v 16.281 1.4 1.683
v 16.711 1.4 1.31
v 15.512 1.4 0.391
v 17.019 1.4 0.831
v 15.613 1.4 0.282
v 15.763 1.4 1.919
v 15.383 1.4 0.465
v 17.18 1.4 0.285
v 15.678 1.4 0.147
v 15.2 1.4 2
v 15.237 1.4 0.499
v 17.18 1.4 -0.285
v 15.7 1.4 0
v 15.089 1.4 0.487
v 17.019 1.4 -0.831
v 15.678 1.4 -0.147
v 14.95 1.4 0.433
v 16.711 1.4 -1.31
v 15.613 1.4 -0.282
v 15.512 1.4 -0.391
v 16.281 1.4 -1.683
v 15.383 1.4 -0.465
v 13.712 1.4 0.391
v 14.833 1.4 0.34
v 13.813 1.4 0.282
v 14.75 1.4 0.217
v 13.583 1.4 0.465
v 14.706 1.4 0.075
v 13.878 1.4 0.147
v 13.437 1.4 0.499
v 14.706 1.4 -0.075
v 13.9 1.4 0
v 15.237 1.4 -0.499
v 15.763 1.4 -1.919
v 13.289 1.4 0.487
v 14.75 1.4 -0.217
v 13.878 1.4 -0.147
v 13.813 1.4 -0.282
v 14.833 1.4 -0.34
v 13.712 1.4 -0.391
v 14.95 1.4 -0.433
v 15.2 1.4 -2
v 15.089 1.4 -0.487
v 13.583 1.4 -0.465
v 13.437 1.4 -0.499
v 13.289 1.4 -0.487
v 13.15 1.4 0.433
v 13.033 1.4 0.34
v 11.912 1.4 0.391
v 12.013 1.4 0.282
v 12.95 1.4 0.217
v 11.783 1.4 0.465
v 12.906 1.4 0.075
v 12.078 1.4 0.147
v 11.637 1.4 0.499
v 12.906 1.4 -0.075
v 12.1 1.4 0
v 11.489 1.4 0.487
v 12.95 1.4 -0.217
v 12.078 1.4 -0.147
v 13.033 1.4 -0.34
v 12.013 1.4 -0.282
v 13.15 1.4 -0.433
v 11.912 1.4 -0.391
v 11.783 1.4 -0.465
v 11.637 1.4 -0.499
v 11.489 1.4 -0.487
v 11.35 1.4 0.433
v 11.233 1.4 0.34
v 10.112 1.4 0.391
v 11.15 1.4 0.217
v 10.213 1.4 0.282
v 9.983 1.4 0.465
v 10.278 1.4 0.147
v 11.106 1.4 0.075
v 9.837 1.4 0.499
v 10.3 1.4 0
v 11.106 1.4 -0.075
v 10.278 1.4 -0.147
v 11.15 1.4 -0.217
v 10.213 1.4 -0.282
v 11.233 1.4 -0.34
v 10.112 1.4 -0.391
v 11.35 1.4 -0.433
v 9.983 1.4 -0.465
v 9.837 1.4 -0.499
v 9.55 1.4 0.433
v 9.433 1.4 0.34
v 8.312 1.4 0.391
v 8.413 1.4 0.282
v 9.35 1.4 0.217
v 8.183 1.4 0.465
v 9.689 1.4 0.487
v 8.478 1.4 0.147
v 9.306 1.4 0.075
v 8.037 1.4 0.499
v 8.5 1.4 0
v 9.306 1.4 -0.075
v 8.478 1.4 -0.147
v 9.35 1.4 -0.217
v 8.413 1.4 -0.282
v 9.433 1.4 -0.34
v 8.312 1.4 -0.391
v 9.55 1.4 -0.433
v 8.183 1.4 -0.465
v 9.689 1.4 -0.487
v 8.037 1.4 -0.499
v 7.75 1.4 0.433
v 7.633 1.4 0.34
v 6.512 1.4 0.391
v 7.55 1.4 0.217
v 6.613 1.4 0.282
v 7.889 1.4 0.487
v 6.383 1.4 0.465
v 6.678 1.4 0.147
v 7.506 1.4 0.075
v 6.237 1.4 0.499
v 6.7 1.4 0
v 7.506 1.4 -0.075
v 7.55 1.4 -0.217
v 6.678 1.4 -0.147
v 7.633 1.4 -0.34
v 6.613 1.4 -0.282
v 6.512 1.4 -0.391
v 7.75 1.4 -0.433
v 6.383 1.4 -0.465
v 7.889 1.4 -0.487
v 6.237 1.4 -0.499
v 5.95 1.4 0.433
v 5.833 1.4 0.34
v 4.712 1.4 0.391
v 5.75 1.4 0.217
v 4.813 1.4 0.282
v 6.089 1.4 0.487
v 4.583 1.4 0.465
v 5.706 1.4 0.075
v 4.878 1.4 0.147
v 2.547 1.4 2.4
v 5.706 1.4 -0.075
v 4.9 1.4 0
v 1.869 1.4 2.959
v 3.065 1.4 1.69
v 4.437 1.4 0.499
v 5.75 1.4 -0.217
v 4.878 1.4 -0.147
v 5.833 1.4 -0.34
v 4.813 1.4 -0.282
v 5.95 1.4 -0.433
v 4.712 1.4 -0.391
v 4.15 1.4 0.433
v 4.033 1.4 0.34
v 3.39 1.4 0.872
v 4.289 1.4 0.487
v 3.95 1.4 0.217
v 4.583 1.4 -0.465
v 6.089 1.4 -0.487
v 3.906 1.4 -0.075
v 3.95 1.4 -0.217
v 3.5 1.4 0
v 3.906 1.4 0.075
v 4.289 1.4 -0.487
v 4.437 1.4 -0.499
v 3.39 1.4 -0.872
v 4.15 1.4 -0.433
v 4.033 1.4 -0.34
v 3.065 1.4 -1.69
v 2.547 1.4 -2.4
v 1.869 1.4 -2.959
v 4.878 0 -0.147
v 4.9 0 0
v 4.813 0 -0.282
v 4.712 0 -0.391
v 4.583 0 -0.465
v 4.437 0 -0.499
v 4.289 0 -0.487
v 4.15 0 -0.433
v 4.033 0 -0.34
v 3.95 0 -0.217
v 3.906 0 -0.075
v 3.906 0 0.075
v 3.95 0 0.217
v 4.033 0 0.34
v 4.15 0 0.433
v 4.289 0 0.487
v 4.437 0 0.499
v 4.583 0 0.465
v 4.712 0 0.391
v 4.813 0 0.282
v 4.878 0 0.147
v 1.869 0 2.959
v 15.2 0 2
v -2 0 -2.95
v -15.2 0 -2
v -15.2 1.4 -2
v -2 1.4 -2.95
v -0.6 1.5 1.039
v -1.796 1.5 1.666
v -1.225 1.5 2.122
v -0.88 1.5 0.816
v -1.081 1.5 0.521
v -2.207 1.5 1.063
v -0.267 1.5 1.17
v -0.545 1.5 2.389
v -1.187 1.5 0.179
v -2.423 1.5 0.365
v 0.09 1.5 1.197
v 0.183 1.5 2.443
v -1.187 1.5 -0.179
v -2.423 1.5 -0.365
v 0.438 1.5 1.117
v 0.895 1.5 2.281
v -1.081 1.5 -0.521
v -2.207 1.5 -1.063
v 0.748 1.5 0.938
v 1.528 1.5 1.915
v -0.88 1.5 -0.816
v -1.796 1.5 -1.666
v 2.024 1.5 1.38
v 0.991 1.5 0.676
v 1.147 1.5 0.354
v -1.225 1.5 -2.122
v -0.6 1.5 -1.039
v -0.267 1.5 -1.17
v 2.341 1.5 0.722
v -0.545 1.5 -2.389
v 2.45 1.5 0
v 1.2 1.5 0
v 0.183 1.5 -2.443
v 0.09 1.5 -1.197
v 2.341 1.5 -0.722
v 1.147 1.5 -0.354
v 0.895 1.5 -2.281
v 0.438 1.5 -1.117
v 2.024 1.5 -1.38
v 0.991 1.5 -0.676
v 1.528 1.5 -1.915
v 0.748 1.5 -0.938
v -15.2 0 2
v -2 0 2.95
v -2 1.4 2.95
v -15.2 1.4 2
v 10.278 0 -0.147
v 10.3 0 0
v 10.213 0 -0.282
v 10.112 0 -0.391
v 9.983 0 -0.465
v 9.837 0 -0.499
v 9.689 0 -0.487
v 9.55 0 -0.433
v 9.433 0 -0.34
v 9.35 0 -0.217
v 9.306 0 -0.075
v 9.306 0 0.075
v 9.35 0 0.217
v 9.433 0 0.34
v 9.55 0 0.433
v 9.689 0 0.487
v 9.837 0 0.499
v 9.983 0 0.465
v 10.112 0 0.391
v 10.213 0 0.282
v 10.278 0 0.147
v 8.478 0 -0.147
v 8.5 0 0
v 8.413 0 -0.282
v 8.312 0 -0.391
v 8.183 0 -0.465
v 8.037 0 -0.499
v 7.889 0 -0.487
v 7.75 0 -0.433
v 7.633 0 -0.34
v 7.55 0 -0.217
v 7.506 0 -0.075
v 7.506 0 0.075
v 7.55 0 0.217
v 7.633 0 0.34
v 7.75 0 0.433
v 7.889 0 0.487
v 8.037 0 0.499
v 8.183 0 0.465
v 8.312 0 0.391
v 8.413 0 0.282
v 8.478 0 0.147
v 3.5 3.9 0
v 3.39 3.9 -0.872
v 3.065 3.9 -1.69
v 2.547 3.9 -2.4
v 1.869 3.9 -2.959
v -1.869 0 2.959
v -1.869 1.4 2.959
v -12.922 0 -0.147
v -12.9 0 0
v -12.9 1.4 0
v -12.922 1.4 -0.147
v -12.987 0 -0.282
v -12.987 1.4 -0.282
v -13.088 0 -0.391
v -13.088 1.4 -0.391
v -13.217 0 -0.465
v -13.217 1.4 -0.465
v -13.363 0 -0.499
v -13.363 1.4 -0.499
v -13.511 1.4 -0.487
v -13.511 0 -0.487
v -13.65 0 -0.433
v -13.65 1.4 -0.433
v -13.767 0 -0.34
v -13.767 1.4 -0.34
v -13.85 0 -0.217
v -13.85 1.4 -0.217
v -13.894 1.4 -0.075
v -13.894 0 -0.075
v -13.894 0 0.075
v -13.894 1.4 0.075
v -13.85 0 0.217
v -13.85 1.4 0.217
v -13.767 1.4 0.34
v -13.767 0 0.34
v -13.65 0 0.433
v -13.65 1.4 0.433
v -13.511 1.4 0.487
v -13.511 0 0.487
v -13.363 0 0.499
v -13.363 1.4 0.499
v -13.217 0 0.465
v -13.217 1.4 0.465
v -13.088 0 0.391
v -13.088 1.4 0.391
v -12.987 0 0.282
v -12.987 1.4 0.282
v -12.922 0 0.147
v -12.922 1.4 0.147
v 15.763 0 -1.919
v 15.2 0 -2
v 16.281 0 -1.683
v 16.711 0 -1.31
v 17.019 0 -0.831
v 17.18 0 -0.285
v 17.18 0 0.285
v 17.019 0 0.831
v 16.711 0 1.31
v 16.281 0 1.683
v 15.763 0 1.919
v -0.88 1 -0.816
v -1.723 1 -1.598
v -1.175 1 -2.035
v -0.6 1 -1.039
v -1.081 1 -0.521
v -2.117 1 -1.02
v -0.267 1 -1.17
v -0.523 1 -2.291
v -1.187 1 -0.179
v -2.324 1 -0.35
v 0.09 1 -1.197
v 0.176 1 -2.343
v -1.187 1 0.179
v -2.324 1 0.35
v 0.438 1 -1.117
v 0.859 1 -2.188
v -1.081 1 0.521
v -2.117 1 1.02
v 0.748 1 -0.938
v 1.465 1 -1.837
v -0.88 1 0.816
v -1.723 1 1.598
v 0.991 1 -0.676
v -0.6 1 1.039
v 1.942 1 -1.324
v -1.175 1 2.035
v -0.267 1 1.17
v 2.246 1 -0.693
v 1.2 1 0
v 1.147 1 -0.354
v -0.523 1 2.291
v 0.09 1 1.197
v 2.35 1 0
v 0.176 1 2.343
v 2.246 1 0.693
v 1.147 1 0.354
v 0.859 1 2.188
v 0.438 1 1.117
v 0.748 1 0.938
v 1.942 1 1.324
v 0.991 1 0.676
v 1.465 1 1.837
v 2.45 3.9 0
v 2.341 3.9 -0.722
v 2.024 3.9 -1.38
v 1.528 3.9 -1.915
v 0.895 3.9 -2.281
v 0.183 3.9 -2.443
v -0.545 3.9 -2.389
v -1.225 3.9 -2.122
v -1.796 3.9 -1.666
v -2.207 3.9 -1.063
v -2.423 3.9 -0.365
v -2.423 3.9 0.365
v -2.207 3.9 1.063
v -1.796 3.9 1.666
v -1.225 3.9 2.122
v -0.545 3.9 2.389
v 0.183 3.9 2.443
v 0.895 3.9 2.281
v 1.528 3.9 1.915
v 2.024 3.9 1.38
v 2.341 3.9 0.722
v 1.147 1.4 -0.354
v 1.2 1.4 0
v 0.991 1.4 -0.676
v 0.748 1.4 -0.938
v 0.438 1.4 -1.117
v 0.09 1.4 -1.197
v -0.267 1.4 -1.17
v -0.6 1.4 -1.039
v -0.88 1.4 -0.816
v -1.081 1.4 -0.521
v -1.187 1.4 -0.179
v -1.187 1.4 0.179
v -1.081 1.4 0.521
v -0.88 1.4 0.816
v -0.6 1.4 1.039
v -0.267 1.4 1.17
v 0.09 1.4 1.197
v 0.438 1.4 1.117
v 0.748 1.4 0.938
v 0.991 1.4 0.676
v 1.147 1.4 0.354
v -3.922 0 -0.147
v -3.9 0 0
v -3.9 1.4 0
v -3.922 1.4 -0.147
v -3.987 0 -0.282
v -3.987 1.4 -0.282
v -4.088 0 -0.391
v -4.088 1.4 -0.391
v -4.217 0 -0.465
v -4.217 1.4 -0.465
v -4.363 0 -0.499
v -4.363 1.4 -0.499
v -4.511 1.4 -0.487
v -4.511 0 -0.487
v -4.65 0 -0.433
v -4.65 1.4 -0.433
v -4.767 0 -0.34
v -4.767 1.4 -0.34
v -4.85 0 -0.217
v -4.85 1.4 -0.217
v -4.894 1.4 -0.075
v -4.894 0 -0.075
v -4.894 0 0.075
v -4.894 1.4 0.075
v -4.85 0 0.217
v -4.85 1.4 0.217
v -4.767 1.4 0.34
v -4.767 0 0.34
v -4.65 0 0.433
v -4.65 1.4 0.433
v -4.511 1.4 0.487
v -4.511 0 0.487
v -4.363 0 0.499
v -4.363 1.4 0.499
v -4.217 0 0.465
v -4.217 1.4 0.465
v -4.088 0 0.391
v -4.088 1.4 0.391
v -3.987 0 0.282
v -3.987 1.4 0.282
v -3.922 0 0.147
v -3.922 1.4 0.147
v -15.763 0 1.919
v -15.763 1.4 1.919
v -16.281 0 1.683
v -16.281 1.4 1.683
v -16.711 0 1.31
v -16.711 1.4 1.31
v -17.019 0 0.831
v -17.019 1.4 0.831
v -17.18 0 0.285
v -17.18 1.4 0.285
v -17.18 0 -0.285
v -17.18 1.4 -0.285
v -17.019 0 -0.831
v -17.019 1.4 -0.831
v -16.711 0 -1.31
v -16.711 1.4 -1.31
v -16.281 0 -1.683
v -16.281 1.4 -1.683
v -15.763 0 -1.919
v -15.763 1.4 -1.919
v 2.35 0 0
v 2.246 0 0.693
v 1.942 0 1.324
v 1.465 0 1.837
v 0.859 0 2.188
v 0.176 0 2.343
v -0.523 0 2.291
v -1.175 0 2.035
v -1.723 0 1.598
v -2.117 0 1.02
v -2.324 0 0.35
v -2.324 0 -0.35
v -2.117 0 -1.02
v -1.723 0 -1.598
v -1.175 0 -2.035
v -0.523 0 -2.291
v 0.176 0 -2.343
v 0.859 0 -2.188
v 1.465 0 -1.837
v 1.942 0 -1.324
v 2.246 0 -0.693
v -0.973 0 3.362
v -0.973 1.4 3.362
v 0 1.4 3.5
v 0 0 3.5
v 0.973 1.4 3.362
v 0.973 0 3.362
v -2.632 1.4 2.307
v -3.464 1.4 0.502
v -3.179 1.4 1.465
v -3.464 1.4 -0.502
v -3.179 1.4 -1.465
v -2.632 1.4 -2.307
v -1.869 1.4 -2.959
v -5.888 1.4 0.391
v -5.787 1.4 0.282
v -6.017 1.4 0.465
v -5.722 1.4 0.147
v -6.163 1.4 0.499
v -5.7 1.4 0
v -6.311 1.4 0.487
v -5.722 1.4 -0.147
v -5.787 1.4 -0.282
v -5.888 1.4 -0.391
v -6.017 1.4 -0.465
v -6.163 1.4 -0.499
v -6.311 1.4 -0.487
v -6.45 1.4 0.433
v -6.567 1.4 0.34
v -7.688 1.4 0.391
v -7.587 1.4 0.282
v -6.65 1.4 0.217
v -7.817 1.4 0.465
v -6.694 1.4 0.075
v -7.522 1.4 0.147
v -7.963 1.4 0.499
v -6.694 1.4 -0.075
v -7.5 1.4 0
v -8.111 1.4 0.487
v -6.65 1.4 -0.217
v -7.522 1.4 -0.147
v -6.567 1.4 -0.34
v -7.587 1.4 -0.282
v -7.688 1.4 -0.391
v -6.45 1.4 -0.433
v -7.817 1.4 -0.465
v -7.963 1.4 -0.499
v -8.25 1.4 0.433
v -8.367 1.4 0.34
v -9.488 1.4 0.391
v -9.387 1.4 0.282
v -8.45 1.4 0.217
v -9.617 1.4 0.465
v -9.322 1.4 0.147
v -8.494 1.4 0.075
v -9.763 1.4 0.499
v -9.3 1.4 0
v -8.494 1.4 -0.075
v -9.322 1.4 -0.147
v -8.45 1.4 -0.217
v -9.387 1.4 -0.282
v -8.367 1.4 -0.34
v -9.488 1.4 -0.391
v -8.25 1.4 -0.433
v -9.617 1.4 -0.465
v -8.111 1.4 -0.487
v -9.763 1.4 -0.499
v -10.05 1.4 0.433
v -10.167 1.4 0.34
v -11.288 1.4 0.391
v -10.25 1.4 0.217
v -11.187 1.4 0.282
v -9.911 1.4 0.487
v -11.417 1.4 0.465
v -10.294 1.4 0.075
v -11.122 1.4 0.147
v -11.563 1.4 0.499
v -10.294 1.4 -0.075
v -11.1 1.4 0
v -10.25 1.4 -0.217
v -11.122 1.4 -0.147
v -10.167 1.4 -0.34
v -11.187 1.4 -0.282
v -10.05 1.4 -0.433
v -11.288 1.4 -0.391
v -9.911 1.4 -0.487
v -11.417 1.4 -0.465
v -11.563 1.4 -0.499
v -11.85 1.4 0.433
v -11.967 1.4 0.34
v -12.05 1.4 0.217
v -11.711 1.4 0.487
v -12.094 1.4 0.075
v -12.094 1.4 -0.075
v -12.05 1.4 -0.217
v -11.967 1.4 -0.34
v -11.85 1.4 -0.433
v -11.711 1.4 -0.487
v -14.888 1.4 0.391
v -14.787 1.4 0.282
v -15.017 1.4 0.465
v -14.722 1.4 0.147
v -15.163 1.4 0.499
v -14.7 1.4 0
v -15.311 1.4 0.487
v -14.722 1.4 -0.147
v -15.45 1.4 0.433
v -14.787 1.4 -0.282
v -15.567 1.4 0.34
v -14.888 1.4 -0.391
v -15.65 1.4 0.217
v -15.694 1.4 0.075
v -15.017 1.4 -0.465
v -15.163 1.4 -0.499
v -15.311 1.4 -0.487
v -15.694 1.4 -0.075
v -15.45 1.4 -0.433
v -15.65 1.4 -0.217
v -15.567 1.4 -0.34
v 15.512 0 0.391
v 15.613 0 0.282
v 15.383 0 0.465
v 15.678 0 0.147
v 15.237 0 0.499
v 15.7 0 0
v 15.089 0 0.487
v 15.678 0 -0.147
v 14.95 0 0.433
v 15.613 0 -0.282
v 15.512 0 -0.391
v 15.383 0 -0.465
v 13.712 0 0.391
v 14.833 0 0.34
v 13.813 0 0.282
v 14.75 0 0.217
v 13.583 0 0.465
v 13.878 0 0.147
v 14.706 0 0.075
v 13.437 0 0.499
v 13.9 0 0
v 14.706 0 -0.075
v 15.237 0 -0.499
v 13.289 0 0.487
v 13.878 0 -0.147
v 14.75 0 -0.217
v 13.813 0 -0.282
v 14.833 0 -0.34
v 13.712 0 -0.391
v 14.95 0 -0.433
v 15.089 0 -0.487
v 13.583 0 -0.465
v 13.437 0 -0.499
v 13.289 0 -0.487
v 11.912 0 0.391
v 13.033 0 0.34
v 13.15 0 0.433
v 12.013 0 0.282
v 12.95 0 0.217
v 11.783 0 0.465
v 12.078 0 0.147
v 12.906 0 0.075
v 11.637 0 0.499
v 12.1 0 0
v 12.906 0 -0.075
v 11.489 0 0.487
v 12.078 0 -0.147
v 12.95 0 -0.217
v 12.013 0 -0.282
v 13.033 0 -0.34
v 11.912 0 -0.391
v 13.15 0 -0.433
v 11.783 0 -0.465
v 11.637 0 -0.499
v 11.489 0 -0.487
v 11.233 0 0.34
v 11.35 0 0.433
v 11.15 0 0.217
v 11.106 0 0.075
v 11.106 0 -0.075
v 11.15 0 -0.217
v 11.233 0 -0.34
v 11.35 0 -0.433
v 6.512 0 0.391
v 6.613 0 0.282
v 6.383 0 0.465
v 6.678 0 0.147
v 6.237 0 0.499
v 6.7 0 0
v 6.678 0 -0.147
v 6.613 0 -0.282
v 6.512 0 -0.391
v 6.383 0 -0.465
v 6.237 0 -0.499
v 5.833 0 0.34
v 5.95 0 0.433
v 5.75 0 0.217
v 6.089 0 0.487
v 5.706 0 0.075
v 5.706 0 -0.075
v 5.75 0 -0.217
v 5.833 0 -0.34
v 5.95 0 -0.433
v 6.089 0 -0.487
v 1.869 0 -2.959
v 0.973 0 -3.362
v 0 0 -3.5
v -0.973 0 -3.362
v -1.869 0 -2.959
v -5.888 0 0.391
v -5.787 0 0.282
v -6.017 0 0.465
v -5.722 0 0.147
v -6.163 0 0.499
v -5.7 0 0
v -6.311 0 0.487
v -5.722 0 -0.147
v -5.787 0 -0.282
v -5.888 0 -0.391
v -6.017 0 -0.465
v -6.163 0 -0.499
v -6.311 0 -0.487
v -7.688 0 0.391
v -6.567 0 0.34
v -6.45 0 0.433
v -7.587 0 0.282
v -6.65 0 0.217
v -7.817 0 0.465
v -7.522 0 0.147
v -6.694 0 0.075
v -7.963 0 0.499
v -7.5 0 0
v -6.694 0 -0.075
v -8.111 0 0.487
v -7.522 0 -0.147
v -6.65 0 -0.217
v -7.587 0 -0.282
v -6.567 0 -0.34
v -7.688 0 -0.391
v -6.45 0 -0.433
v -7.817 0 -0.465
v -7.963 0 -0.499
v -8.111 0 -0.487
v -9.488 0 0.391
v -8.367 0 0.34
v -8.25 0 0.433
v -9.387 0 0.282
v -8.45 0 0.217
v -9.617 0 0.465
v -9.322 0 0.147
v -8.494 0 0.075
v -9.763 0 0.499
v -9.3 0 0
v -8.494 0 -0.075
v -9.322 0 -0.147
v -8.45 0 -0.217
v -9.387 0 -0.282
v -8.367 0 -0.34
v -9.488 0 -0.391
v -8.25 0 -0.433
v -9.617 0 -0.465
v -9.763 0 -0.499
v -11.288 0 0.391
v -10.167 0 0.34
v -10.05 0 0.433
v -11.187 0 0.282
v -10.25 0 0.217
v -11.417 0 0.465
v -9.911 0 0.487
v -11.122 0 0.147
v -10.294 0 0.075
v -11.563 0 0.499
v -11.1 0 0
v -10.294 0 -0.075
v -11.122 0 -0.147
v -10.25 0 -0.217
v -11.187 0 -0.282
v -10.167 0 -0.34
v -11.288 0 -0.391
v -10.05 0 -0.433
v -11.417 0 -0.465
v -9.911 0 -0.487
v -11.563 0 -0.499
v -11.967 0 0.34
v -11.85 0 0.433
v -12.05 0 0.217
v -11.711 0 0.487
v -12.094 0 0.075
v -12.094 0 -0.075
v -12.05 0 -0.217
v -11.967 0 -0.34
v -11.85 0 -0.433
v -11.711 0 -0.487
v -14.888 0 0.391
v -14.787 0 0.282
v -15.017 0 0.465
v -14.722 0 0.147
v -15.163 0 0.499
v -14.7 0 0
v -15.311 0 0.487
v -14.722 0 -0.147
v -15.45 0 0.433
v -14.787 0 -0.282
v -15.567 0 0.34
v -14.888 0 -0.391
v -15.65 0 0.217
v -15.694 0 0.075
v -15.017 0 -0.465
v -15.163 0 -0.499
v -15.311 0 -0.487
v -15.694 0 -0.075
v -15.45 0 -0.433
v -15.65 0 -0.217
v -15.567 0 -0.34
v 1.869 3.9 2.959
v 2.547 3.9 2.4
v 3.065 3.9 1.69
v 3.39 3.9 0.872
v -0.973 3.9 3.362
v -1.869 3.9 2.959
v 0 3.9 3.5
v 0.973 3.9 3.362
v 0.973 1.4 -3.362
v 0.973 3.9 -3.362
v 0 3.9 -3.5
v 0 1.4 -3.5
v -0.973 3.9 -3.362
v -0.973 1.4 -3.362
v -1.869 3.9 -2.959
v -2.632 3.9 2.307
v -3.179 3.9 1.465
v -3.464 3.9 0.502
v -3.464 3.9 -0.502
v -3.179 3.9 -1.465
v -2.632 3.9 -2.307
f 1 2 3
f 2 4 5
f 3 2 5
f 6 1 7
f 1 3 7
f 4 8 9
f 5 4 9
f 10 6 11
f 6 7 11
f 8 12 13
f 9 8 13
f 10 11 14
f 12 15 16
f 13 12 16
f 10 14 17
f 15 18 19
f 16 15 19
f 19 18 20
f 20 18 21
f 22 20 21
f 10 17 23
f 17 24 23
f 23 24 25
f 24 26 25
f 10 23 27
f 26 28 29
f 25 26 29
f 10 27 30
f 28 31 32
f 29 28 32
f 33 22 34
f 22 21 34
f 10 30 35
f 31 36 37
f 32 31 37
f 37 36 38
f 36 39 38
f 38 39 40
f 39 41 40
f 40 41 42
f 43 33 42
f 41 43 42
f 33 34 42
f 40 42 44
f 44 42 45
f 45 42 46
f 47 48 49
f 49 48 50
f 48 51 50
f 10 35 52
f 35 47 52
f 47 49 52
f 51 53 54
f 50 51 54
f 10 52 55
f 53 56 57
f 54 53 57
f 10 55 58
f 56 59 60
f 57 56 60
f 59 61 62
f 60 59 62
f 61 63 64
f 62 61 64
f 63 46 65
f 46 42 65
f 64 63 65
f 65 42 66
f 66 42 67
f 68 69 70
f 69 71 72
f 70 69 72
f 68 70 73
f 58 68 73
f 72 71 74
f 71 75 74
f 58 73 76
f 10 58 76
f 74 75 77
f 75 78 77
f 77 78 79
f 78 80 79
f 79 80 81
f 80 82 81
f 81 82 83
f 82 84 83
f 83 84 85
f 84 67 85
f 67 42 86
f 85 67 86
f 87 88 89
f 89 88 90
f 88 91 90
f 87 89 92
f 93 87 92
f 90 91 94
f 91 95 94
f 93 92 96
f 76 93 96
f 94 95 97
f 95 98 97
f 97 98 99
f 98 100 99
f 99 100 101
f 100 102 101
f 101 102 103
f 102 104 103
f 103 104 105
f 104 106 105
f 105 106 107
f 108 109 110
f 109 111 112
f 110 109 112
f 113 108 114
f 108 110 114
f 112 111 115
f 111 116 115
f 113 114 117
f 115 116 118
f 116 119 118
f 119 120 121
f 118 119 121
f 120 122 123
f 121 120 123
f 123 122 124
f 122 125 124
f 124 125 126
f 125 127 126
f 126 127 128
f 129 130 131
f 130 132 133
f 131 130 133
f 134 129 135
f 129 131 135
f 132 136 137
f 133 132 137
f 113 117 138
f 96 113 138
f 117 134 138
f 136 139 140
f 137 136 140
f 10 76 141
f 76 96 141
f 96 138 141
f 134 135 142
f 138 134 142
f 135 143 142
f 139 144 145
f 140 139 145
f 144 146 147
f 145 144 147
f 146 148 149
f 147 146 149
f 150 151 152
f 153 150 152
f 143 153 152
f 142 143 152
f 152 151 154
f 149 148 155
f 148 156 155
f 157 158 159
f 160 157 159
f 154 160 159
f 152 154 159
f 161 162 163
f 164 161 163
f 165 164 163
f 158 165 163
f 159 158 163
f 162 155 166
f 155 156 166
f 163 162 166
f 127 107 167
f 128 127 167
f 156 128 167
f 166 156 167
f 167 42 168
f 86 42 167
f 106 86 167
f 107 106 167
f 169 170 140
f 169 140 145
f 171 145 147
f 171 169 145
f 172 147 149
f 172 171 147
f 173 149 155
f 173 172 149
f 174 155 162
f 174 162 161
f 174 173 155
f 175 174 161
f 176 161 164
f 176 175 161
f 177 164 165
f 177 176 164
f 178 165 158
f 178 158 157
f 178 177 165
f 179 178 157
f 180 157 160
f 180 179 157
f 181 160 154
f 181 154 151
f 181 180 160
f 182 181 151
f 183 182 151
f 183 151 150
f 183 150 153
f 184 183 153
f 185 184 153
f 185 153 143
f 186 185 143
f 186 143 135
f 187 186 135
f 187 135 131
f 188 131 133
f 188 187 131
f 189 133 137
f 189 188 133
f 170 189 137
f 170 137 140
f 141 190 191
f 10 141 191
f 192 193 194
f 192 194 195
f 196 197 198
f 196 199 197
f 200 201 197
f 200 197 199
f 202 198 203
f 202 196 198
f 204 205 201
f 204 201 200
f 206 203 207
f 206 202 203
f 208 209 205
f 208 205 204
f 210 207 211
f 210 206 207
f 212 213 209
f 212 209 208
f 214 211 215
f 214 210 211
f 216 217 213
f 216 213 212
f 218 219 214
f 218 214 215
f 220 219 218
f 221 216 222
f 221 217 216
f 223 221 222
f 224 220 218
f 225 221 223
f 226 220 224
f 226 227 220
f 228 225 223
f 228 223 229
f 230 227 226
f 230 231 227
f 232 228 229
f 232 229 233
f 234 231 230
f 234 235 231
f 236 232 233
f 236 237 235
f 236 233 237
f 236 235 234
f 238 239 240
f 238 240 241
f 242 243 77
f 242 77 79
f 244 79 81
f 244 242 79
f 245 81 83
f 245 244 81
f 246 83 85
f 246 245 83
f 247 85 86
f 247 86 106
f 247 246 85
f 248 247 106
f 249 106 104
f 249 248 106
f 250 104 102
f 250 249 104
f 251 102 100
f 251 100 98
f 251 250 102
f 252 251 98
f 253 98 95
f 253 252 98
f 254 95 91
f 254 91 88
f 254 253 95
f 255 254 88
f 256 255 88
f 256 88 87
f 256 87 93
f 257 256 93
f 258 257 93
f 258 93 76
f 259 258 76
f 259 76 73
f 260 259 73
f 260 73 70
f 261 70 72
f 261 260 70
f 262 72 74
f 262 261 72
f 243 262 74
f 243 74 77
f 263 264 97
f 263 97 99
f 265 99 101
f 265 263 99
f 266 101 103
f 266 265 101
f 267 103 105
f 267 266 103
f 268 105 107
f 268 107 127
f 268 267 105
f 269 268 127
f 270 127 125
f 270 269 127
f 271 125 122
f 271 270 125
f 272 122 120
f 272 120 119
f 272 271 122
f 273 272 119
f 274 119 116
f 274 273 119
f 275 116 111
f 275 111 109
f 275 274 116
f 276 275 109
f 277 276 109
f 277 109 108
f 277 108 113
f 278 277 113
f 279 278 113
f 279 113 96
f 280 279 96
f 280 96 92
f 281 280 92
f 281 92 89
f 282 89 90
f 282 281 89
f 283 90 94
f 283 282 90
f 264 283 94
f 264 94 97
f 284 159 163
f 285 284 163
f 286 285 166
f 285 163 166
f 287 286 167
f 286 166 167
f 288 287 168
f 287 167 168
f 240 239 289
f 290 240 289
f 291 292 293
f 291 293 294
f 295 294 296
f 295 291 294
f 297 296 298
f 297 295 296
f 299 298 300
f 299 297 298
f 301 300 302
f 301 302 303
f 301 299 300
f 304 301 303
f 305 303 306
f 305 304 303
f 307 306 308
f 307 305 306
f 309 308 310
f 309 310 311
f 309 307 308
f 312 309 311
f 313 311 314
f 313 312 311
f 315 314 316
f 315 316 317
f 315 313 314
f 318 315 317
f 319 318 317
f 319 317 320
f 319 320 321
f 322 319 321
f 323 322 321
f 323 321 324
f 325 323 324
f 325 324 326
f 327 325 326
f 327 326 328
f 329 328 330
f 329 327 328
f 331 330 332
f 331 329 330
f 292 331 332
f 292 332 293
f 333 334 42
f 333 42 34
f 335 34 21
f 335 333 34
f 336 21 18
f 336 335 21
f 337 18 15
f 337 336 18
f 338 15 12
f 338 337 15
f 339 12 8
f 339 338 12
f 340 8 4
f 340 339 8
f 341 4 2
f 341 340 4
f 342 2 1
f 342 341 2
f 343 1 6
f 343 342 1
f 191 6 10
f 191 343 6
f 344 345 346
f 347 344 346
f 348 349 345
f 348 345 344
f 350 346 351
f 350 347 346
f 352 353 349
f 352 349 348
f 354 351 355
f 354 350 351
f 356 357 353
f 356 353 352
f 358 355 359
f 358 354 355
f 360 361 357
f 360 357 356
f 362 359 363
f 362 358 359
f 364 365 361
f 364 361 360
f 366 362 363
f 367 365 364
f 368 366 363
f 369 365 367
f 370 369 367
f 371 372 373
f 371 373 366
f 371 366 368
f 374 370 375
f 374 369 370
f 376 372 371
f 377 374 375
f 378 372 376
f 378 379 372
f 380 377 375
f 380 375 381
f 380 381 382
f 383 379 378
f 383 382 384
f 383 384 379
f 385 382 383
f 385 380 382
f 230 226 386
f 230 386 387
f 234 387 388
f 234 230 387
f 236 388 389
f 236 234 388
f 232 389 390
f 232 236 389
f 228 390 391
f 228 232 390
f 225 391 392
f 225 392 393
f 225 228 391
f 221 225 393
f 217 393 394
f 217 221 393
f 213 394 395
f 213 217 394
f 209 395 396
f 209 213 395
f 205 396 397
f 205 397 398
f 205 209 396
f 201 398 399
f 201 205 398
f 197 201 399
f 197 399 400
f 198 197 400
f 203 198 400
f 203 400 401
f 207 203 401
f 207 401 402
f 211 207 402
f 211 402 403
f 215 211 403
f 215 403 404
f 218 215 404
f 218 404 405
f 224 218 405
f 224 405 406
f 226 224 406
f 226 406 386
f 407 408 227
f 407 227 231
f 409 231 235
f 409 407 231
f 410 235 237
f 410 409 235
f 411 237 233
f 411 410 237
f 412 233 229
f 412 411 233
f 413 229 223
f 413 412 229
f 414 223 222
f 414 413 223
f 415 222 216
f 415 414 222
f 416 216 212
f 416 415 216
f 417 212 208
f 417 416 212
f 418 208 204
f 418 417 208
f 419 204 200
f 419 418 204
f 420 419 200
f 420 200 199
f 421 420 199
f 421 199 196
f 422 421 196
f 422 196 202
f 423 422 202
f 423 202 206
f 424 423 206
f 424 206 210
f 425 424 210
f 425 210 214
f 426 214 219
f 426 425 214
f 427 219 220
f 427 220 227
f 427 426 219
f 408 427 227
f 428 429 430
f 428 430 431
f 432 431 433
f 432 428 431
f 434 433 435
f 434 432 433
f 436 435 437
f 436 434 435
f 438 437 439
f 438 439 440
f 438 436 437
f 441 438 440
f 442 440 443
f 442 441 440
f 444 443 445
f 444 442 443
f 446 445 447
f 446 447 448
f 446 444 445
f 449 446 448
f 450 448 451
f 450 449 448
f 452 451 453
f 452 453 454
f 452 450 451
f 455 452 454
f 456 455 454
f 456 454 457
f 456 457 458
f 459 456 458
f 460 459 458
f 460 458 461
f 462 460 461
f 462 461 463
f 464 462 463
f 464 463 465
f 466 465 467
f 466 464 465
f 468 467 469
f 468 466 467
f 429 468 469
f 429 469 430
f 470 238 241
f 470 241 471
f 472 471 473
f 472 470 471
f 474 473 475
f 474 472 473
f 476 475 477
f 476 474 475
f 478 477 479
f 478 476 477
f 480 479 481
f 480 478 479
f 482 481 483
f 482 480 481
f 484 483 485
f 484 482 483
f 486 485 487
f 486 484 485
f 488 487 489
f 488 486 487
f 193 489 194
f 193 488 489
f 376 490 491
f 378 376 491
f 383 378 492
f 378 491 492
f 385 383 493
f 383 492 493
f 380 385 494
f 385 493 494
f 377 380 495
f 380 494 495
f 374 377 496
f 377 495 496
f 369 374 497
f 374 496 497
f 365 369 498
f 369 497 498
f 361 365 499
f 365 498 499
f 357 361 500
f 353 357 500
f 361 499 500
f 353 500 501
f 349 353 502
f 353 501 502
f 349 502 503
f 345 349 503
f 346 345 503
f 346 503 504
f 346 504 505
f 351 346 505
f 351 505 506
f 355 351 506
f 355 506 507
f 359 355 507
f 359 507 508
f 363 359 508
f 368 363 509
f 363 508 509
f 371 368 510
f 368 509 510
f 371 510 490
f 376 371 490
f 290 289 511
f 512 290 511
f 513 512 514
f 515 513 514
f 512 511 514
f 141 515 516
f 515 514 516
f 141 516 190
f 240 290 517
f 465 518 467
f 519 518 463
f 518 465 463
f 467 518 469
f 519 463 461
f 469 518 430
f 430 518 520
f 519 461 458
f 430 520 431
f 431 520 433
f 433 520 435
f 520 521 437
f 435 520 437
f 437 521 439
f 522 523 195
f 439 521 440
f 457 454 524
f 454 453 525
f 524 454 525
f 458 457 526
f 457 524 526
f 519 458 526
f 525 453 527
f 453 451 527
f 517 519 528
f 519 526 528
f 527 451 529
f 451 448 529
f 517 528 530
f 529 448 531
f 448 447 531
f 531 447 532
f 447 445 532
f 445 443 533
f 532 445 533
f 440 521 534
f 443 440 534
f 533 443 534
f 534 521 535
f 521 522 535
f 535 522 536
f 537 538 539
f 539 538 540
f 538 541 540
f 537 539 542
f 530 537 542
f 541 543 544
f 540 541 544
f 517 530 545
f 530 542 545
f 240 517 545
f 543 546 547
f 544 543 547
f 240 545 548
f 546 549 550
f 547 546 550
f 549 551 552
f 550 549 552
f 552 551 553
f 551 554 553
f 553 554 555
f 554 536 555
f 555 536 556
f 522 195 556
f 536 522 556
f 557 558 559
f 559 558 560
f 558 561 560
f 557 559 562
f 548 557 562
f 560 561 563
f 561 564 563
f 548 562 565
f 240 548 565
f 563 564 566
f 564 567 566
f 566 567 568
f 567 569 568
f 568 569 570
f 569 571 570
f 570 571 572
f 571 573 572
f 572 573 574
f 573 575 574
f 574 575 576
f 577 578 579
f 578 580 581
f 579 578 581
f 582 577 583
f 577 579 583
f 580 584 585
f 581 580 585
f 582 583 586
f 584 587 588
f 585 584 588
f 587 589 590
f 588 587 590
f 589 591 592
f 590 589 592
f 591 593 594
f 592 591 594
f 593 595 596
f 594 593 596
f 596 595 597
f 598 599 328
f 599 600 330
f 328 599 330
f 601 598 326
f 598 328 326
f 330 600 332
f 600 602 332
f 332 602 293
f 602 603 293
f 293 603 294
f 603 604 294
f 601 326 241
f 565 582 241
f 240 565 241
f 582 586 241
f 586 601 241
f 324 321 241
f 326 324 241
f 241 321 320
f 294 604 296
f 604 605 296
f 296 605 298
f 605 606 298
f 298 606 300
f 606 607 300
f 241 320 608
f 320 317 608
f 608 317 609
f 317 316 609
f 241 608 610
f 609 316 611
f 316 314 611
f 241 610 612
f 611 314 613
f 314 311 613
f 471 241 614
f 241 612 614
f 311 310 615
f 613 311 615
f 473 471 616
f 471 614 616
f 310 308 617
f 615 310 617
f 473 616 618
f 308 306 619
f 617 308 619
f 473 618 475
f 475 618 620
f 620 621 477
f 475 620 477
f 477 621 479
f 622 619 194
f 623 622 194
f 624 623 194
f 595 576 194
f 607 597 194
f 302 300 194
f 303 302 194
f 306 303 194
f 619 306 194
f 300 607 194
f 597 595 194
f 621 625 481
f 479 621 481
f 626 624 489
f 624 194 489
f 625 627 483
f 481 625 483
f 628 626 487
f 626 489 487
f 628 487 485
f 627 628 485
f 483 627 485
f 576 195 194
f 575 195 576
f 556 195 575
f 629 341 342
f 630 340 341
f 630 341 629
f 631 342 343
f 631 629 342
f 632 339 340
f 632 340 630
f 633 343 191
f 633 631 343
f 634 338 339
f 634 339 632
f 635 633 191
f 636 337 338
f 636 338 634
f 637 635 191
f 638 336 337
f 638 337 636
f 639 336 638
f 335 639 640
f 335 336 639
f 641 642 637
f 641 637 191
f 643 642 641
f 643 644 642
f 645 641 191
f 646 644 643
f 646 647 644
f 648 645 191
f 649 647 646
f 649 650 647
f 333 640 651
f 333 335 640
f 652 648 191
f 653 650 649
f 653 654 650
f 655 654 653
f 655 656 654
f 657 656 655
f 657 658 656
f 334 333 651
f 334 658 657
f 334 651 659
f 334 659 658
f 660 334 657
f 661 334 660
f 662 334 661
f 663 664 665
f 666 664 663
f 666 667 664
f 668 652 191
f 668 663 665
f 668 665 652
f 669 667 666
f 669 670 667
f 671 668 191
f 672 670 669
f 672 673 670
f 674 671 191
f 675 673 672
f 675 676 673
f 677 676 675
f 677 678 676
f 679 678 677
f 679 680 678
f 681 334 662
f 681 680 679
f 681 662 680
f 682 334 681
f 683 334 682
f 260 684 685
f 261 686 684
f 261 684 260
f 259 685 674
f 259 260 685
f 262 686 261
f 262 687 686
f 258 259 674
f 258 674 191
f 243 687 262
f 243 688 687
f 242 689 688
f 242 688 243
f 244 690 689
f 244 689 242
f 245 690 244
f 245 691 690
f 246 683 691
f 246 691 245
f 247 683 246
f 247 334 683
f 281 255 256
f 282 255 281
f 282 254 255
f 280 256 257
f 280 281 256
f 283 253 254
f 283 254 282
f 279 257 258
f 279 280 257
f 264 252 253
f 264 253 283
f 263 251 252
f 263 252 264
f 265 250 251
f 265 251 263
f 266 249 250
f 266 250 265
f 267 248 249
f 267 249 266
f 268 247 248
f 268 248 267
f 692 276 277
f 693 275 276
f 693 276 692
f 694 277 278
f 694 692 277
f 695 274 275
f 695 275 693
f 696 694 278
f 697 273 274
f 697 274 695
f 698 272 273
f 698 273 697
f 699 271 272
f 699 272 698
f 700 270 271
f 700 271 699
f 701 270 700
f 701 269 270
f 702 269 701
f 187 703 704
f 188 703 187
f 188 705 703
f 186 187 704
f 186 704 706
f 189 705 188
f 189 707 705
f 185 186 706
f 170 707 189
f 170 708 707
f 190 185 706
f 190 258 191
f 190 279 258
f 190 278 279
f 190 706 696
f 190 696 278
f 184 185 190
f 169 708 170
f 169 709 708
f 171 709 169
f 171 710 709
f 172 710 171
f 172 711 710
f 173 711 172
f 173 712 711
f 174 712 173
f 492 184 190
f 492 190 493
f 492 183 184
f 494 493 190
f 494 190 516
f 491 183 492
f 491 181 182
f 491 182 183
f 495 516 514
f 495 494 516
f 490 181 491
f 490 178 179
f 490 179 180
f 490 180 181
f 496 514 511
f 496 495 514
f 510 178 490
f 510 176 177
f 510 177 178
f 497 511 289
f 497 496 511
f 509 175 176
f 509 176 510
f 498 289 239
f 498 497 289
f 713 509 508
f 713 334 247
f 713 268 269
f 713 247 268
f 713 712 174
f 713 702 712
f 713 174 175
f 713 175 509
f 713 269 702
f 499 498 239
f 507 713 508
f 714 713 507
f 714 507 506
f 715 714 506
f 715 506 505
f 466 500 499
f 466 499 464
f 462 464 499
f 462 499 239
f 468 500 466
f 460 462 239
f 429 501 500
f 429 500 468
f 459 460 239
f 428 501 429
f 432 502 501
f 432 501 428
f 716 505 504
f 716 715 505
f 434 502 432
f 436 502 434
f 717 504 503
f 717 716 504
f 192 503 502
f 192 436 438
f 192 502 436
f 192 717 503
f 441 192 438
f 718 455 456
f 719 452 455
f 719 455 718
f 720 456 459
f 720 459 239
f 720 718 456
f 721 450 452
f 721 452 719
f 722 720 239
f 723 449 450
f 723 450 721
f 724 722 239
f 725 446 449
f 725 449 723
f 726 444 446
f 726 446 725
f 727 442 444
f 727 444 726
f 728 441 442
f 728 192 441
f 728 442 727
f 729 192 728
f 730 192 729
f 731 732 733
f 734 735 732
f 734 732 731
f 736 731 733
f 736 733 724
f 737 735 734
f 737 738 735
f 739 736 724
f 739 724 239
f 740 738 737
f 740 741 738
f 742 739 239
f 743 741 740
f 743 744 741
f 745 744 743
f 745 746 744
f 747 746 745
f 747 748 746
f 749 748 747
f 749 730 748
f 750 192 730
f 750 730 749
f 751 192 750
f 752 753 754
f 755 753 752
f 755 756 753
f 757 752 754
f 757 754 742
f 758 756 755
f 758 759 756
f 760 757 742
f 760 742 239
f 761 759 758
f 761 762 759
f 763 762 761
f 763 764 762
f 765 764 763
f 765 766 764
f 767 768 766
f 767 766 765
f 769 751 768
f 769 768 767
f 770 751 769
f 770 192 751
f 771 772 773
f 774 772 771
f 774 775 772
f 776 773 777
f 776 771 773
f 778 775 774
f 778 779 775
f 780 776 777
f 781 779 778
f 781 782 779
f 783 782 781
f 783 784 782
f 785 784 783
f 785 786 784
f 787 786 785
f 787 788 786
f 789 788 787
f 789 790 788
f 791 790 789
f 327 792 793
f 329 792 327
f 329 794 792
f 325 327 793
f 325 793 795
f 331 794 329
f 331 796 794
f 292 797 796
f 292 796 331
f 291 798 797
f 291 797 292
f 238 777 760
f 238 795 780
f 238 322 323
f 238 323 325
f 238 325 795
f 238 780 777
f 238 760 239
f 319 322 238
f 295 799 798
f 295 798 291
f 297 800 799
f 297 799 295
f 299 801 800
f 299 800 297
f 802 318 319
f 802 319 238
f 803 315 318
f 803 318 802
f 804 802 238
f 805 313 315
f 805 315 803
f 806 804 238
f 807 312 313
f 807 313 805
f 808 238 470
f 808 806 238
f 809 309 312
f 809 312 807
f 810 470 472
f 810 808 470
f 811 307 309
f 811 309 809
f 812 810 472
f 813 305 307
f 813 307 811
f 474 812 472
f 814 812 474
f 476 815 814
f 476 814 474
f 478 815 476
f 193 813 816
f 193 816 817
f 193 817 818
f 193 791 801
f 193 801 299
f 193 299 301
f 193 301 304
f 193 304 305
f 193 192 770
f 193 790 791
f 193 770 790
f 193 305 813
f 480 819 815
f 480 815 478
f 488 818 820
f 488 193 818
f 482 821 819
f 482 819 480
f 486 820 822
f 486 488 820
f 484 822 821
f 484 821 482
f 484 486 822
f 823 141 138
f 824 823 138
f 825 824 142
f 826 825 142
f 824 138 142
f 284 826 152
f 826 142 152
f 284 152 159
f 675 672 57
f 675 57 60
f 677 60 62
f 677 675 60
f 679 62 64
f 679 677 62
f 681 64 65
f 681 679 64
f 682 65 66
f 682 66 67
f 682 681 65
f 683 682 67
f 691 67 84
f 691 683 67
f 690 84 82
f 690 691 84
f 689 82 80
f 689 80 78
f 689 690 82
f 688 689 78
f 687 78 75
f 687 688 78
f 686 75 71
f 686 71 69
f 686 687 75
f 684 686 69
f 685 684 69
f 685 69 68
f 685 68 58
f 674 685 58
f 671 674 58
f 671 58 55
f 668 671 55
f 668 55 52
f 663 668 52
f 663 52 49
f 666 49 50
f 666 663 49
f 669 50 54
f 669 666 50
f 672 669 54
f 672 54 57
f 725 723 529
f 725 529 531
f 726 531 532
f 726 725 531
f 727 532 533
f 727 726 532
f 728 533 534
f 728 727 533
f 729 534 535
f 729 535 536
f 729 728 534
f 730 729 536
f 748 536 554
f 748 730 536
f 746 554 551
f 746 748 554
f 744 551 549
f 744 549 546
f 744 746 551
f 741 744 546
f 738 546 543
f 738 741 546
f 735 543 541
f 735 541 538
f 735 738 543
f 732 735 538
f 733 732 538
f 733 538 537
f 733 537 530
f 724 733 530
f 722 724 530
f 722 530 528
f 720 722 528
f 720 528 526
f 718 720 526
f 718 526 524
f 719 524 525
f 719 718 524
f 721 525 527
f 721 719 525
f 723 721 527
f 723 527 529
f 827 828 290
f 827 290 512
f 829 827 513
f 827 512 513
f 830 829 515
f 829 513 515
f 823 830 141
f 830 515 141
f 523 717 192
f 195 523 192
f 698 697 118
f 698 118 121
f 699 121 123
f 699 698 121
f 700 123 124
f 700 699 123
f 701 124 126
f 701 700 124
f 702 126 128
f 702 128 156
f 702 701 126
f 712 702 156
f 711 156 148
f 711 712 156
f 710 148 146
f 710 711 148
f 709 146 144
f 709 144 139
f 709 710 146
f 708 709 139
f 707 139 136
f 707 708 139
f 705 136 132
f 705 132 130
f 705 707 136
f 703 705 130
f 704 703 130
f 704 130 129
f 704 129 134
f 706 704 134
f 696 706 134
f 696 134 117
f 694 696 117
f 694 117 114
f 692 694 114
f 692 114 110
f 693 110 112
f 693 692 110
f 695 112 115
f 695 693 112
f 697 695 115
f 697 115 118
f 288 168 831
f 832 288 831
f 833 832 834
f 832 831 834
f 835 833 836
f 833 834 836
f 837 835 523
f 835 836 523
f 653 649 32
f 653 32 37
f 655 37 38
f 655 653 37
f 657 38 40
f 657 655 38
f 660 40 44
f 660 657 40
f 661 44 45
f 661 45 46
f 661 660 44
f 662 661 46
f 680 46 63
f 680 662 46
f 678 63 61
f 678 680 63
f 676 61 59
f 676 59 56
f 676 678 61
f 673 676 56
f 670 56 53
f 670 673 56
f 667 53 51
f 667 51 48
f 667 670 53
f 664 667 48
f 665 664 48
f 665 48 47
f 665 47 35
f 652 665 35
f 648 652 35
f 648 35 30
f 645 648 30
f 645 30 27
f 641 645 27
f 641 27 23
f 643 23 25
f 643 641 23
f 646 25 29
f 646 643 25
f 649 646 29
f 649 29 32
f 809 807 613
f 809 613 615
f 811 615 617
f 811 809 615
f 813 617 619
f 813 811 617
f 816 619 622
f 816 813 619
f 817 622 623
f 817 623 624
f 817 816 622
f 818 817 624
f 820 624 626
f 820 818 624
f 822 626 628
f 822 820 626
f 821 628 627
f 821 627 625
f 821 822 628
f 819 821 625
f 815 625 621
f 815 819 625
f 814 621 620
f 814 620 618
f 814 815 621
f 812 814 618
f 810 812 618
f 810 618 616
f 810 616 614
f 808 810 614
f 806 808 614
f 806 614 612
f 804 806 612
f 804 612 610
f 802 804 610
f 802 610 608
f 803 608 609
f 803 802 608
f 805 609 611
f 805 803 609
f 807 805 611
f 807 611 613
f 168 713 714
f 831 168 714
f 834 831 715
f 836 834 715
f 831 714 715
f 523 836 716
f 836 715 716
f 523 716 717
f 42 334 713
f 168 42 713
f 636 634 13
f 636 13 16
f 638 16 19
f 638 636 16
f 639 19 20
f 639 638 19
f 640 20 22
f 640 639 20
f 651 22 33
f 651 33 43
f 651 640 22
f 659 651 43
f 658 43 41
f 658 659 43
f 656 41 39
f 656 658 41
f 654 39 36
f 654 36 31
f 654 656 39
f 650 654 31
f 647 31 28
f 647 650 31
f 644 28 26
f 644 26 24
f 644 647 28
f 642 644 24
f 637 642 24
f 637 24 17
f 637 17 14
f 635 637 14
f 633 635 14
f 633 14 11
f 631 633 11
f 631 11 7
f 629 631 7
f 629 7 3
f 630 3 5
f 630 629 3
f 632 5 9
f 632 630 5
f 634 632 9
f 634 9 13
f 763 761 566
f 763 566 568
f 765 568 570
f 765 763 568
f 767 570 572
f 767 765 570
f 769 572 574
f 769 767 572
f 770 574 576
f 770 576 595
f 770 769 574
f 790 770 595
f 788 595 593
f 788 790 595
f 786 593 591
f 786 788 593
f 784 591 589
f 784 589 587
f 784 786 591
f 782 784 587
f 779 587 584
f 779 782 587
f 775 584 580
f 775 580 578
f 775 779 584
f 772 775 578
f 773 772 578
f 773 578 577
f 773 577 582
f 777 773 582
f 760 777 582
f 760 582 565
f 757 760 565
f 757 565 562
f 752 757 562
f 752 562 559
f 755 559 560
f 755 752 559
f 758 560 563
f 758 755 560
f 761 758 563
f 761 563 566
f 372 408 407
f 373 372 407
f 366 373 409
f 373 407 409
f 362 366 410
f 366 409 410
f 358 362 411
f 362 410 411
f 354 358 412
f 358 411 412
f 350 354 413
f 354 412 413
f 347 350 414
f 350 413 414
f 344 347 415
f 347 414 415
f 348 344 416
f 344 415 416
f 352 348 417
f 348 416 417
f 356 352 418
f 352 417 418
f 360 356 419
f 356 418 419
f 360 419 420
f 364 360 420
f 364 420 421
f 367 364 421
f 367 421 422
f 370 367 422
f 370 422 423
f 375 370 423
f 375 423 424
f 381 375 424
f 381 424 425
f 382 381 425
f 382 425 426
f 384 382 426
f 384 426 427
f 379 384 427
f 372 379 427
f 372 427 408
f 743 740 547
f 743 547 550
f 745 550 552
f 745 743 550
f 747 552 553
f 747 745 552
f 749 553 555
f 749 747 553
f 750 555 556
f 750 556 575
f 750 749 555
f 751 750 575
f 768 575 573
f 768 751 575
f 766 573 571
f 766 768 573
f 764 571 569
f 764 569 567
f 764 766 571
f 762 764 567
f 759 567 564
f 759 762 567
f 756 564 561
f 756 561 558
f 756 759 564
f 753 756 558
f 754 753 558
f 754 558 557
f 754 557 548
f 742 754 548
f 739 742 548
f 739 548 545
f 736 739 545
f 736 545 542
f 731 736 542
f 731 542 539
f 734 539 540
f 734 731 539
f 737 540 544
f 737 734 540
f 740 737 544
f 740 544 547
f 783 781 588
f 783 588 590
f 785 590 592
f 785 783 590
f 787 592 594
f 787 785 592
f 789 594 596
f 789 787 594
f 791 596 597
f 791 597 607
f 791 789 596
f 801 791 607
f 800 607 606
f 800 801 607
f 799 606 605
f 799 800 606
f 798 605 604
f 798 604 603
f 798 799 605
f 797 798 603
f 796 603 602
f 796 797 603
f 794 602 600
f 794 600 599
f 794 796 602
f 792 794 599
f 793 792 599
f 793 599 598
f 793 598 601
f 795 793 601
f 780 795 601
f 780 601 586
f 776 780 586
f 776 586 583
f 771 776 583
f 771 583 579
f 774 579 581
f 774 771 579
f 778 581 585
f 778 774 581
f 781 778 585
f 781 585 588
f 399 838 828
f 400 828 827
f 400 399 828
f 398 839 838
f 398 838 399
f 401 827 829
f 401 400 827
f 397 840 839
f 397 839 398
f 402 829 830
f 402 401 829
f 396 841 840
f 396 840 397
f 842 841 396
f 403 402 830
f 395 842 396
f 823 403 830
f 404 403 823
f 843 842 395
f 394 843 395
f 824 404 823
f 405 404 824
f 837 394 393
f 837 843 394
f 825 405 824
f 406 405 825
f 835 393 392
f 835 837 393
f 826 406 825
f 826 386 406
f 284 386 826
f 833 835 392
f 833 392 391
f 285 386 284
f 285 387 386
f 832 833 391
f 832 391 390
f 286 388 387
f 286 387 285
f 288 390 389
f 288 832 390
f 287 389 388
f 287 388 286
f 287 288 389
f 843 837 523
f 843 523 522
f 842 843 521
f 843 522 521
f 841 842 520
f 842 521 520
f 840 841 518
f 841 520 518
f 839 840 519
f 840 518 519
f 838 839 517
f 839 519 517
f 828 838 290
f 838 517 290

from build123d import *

# Parameters (mm, degrees)
SKETCH1_R           = 0.5
BOSS_EXTRUDE1_DEPTH = 1.4
SKETCH2_R           = 2.35
CUT_EXTRUDE1_DEPTH  = 1
SKETCH3_R           = 3.5
SKETCH3_R_2         = 2.45
BOSS_EXTRUDE2_DEPTH = 2.5
SKETCH4_R           = 1.2
CUT_EXTRUDE2_DEPTH  = 2.4
SKETCH5_R           = 2.45
SKETCH5_R_2         = 1.2
BOSS_EXTRUDE3_DEPTH = 0.1
SKETCH6_W           = 35.735260114
SKETCH6_H           = 17.672039004
CUT_EXTRUDE4_DEPTH  = 4.9


with BuildPart() as part:
    # Sketch1 → Boss-Extrude1 (new body)
    with BuildSketch(Plane(origin=(0, 0, 0), x_dir=(1, 0, 0), z_dir=(0, 1, 0))):
        with BuildLine():
            Line((-15.2, 2), (-2, 2.95))
            Line((-2, 2.95), (-2, 6.35))
            ThreePointArc((-2, 6.35), (0, 8.35), (2, 6.35))
            Line((2, 6.35), (2, 3.5))
            Line((2, 3.5), (15.2, 2))
            ThreePointArc((15.2, 2), (17.2, 0), (15.2, -2))
            Line((15.2, -2), (2, -3.5))
            Line((2, -3.5), (2, -6.35))
            ThreePointArc((2, -6.35), (0, -8.35), (-2, -6.35))
            Line((-2, -6.35), (-2, -2.95))
            Line((-2, -2.95), (-15.2, -2))
            ThreePointArc((-15.2, -2), (-17.2, 0), (-15.2, 2))
        make_face()
        with Locations((0, 6.35)):
            Circle(SKETCH1_R, mode=Mode.SUBTRACT)
        with Locations((0, 4.55)):
            Circle(SKETCH1_R, mode=Mode.SUBTRACT)
        with Locations((0, -4.55)):
            Circle(SKETCH1_R, mode=Mode.SUBTRACT)
        with Locations((0, -6.35)):
            Circle(SKETCH1_R, mode=Mode.SUBTRACT)
        with Locations((-15.2, 0)):
            Circle(SKETCH1_R, mode=Mode.SUBTRACT)
        with Locations((15.2, 0)):
            Circle(SKETCH1_R, mode=Mode.SUBTRACT)
        with Locations((-13.4, 0)):
            Circle(SKETCH1_R, mode=Mode.SUBTRACT)
        with Locations((-11.6, 0)):
            Circle(SKETCH1_R, mode=Mode.SUBTRACT)
        with Locations((-9.8, 0)):
            Circle(SKETCH1_R, mode=Mode.SUBTRACT)
        with Locations((-8, 0)):
            Circle(SKETCH1_R, mode=Mode.SUBTRACT)
        with Locations((-6.2, 0)):
            Circle(SKETCH1_R, mode=Mode.SUBTRACT)
        with Locations((-4.4, 0)):
            Circle(SKETCH1_R, mode=Mode.SUBTRACT)
        with Locations((13.4, 0)):
            Circle(SKETCH1_R, mode=Mode.SUBTRACT)
        with Locations((11.6, 0)):
            Circle(SKETCH1_R, mode=Mode.SUBTRACT)
        with Locations((9.8, 0)):
            Circle(SKETCH1_R, mode=Mode.SUBTRACT)
        with Locations((8, 0)):
            Circle(SKETCH1_R, mode=Mode.SUBTRACT)
        with Locations((6.2, 0)):
            Circle(SKETCH1_R, mode=Mode.SUBTRACT)
        with Locations((4.4, 0)):
            Circle(SKETCH1_R, mode=Mode.SUBTRACT)
    extrude(amount=BOSS_EXTRUDE1_DEPTH)

    # Sketch2 → Cut-Extrude1 (cut)
    with BuildSketch(Plane.XZ):
        Circle(SKETCH2_R)
    extrude(amount=-CUT_EXTRUDE1_DEPTH, mode=Mode.SUBTRACT)

    # Sketch3 → Boss-Extrude2 (add)
    with BuildSketch(Plane(origin=(0, 1.4, 0), x_dir=(1, 0, 0), z_dir=(0, 1, 0))):
        Circle(SKETCH3_R)
        Circle(SKETCH3_R_2, mode=Mode.SUBTRACT)
    extrude(amount=BOSS_EXTRUDE2_DEPTH)

    # Sketch4 → Cut-Extrude2 (cut, through all)
    with BuildSketch(Plane(origin=(0, 1.4, 0), x_dir=(1, 0, 0), z_dir=(0, 1, 0))):
        Circle(SKETCH4_R)
    extrude(amount=-CUT_EXTRUDE2_DEPTH, mode=Mode.SUBTRACT)

    # Sketch5 → Boss-Extrude3 (add)
    with BuildSketch(Plane(origin=(0, 1.4, 0), x_dir=(1, 0, 0), z_dir=(0, 1, 0))):
        Circle(SKETCH5_R)
        Circle(SKETCH5_R_2, mode=Mode.SUBTRACT)
    extrude(amount=BOSS_EXTRUDE3_DEPTH)

    # Sketch6 → Cut-Extrude4 (cut, through all)
    with BuildSketch(Plane.XZ):
        Rectangle(SKETCH6_W, SKETCH6_H)
        with BuildLine():
            Line((-1.868584713, -2.959457918), (-15.2, -2))
            ThreePointArc((-15.2, -2), (-17.2, 0), (-15.2, 2))
            Line((-15.2, 2), (-1.868584713, 2.959457918))
            ThreePointArc((-1.868584713, 2.959457918), (0, 3.5), (1.868584713, 2.959457918))
            Line((1.868584713, 2.959457918), (15.2, 2))
            ThreePointArc((15.2, 2), (17.2, 0), (15.2, -2))
            Line((15.2, -2), (1.868584713, -2.959457918))
            ThreePointArc((1.868584713, -2.959457918), (0, -3.5), (-1.868584713, -2.959457918))
        make_face(mode=Mode.SUBTRACT)
    extrude(amount=-CUT_EXTRUDE4_DEPTH, mode=Mode.SUBTRACT)


solid = part.part
